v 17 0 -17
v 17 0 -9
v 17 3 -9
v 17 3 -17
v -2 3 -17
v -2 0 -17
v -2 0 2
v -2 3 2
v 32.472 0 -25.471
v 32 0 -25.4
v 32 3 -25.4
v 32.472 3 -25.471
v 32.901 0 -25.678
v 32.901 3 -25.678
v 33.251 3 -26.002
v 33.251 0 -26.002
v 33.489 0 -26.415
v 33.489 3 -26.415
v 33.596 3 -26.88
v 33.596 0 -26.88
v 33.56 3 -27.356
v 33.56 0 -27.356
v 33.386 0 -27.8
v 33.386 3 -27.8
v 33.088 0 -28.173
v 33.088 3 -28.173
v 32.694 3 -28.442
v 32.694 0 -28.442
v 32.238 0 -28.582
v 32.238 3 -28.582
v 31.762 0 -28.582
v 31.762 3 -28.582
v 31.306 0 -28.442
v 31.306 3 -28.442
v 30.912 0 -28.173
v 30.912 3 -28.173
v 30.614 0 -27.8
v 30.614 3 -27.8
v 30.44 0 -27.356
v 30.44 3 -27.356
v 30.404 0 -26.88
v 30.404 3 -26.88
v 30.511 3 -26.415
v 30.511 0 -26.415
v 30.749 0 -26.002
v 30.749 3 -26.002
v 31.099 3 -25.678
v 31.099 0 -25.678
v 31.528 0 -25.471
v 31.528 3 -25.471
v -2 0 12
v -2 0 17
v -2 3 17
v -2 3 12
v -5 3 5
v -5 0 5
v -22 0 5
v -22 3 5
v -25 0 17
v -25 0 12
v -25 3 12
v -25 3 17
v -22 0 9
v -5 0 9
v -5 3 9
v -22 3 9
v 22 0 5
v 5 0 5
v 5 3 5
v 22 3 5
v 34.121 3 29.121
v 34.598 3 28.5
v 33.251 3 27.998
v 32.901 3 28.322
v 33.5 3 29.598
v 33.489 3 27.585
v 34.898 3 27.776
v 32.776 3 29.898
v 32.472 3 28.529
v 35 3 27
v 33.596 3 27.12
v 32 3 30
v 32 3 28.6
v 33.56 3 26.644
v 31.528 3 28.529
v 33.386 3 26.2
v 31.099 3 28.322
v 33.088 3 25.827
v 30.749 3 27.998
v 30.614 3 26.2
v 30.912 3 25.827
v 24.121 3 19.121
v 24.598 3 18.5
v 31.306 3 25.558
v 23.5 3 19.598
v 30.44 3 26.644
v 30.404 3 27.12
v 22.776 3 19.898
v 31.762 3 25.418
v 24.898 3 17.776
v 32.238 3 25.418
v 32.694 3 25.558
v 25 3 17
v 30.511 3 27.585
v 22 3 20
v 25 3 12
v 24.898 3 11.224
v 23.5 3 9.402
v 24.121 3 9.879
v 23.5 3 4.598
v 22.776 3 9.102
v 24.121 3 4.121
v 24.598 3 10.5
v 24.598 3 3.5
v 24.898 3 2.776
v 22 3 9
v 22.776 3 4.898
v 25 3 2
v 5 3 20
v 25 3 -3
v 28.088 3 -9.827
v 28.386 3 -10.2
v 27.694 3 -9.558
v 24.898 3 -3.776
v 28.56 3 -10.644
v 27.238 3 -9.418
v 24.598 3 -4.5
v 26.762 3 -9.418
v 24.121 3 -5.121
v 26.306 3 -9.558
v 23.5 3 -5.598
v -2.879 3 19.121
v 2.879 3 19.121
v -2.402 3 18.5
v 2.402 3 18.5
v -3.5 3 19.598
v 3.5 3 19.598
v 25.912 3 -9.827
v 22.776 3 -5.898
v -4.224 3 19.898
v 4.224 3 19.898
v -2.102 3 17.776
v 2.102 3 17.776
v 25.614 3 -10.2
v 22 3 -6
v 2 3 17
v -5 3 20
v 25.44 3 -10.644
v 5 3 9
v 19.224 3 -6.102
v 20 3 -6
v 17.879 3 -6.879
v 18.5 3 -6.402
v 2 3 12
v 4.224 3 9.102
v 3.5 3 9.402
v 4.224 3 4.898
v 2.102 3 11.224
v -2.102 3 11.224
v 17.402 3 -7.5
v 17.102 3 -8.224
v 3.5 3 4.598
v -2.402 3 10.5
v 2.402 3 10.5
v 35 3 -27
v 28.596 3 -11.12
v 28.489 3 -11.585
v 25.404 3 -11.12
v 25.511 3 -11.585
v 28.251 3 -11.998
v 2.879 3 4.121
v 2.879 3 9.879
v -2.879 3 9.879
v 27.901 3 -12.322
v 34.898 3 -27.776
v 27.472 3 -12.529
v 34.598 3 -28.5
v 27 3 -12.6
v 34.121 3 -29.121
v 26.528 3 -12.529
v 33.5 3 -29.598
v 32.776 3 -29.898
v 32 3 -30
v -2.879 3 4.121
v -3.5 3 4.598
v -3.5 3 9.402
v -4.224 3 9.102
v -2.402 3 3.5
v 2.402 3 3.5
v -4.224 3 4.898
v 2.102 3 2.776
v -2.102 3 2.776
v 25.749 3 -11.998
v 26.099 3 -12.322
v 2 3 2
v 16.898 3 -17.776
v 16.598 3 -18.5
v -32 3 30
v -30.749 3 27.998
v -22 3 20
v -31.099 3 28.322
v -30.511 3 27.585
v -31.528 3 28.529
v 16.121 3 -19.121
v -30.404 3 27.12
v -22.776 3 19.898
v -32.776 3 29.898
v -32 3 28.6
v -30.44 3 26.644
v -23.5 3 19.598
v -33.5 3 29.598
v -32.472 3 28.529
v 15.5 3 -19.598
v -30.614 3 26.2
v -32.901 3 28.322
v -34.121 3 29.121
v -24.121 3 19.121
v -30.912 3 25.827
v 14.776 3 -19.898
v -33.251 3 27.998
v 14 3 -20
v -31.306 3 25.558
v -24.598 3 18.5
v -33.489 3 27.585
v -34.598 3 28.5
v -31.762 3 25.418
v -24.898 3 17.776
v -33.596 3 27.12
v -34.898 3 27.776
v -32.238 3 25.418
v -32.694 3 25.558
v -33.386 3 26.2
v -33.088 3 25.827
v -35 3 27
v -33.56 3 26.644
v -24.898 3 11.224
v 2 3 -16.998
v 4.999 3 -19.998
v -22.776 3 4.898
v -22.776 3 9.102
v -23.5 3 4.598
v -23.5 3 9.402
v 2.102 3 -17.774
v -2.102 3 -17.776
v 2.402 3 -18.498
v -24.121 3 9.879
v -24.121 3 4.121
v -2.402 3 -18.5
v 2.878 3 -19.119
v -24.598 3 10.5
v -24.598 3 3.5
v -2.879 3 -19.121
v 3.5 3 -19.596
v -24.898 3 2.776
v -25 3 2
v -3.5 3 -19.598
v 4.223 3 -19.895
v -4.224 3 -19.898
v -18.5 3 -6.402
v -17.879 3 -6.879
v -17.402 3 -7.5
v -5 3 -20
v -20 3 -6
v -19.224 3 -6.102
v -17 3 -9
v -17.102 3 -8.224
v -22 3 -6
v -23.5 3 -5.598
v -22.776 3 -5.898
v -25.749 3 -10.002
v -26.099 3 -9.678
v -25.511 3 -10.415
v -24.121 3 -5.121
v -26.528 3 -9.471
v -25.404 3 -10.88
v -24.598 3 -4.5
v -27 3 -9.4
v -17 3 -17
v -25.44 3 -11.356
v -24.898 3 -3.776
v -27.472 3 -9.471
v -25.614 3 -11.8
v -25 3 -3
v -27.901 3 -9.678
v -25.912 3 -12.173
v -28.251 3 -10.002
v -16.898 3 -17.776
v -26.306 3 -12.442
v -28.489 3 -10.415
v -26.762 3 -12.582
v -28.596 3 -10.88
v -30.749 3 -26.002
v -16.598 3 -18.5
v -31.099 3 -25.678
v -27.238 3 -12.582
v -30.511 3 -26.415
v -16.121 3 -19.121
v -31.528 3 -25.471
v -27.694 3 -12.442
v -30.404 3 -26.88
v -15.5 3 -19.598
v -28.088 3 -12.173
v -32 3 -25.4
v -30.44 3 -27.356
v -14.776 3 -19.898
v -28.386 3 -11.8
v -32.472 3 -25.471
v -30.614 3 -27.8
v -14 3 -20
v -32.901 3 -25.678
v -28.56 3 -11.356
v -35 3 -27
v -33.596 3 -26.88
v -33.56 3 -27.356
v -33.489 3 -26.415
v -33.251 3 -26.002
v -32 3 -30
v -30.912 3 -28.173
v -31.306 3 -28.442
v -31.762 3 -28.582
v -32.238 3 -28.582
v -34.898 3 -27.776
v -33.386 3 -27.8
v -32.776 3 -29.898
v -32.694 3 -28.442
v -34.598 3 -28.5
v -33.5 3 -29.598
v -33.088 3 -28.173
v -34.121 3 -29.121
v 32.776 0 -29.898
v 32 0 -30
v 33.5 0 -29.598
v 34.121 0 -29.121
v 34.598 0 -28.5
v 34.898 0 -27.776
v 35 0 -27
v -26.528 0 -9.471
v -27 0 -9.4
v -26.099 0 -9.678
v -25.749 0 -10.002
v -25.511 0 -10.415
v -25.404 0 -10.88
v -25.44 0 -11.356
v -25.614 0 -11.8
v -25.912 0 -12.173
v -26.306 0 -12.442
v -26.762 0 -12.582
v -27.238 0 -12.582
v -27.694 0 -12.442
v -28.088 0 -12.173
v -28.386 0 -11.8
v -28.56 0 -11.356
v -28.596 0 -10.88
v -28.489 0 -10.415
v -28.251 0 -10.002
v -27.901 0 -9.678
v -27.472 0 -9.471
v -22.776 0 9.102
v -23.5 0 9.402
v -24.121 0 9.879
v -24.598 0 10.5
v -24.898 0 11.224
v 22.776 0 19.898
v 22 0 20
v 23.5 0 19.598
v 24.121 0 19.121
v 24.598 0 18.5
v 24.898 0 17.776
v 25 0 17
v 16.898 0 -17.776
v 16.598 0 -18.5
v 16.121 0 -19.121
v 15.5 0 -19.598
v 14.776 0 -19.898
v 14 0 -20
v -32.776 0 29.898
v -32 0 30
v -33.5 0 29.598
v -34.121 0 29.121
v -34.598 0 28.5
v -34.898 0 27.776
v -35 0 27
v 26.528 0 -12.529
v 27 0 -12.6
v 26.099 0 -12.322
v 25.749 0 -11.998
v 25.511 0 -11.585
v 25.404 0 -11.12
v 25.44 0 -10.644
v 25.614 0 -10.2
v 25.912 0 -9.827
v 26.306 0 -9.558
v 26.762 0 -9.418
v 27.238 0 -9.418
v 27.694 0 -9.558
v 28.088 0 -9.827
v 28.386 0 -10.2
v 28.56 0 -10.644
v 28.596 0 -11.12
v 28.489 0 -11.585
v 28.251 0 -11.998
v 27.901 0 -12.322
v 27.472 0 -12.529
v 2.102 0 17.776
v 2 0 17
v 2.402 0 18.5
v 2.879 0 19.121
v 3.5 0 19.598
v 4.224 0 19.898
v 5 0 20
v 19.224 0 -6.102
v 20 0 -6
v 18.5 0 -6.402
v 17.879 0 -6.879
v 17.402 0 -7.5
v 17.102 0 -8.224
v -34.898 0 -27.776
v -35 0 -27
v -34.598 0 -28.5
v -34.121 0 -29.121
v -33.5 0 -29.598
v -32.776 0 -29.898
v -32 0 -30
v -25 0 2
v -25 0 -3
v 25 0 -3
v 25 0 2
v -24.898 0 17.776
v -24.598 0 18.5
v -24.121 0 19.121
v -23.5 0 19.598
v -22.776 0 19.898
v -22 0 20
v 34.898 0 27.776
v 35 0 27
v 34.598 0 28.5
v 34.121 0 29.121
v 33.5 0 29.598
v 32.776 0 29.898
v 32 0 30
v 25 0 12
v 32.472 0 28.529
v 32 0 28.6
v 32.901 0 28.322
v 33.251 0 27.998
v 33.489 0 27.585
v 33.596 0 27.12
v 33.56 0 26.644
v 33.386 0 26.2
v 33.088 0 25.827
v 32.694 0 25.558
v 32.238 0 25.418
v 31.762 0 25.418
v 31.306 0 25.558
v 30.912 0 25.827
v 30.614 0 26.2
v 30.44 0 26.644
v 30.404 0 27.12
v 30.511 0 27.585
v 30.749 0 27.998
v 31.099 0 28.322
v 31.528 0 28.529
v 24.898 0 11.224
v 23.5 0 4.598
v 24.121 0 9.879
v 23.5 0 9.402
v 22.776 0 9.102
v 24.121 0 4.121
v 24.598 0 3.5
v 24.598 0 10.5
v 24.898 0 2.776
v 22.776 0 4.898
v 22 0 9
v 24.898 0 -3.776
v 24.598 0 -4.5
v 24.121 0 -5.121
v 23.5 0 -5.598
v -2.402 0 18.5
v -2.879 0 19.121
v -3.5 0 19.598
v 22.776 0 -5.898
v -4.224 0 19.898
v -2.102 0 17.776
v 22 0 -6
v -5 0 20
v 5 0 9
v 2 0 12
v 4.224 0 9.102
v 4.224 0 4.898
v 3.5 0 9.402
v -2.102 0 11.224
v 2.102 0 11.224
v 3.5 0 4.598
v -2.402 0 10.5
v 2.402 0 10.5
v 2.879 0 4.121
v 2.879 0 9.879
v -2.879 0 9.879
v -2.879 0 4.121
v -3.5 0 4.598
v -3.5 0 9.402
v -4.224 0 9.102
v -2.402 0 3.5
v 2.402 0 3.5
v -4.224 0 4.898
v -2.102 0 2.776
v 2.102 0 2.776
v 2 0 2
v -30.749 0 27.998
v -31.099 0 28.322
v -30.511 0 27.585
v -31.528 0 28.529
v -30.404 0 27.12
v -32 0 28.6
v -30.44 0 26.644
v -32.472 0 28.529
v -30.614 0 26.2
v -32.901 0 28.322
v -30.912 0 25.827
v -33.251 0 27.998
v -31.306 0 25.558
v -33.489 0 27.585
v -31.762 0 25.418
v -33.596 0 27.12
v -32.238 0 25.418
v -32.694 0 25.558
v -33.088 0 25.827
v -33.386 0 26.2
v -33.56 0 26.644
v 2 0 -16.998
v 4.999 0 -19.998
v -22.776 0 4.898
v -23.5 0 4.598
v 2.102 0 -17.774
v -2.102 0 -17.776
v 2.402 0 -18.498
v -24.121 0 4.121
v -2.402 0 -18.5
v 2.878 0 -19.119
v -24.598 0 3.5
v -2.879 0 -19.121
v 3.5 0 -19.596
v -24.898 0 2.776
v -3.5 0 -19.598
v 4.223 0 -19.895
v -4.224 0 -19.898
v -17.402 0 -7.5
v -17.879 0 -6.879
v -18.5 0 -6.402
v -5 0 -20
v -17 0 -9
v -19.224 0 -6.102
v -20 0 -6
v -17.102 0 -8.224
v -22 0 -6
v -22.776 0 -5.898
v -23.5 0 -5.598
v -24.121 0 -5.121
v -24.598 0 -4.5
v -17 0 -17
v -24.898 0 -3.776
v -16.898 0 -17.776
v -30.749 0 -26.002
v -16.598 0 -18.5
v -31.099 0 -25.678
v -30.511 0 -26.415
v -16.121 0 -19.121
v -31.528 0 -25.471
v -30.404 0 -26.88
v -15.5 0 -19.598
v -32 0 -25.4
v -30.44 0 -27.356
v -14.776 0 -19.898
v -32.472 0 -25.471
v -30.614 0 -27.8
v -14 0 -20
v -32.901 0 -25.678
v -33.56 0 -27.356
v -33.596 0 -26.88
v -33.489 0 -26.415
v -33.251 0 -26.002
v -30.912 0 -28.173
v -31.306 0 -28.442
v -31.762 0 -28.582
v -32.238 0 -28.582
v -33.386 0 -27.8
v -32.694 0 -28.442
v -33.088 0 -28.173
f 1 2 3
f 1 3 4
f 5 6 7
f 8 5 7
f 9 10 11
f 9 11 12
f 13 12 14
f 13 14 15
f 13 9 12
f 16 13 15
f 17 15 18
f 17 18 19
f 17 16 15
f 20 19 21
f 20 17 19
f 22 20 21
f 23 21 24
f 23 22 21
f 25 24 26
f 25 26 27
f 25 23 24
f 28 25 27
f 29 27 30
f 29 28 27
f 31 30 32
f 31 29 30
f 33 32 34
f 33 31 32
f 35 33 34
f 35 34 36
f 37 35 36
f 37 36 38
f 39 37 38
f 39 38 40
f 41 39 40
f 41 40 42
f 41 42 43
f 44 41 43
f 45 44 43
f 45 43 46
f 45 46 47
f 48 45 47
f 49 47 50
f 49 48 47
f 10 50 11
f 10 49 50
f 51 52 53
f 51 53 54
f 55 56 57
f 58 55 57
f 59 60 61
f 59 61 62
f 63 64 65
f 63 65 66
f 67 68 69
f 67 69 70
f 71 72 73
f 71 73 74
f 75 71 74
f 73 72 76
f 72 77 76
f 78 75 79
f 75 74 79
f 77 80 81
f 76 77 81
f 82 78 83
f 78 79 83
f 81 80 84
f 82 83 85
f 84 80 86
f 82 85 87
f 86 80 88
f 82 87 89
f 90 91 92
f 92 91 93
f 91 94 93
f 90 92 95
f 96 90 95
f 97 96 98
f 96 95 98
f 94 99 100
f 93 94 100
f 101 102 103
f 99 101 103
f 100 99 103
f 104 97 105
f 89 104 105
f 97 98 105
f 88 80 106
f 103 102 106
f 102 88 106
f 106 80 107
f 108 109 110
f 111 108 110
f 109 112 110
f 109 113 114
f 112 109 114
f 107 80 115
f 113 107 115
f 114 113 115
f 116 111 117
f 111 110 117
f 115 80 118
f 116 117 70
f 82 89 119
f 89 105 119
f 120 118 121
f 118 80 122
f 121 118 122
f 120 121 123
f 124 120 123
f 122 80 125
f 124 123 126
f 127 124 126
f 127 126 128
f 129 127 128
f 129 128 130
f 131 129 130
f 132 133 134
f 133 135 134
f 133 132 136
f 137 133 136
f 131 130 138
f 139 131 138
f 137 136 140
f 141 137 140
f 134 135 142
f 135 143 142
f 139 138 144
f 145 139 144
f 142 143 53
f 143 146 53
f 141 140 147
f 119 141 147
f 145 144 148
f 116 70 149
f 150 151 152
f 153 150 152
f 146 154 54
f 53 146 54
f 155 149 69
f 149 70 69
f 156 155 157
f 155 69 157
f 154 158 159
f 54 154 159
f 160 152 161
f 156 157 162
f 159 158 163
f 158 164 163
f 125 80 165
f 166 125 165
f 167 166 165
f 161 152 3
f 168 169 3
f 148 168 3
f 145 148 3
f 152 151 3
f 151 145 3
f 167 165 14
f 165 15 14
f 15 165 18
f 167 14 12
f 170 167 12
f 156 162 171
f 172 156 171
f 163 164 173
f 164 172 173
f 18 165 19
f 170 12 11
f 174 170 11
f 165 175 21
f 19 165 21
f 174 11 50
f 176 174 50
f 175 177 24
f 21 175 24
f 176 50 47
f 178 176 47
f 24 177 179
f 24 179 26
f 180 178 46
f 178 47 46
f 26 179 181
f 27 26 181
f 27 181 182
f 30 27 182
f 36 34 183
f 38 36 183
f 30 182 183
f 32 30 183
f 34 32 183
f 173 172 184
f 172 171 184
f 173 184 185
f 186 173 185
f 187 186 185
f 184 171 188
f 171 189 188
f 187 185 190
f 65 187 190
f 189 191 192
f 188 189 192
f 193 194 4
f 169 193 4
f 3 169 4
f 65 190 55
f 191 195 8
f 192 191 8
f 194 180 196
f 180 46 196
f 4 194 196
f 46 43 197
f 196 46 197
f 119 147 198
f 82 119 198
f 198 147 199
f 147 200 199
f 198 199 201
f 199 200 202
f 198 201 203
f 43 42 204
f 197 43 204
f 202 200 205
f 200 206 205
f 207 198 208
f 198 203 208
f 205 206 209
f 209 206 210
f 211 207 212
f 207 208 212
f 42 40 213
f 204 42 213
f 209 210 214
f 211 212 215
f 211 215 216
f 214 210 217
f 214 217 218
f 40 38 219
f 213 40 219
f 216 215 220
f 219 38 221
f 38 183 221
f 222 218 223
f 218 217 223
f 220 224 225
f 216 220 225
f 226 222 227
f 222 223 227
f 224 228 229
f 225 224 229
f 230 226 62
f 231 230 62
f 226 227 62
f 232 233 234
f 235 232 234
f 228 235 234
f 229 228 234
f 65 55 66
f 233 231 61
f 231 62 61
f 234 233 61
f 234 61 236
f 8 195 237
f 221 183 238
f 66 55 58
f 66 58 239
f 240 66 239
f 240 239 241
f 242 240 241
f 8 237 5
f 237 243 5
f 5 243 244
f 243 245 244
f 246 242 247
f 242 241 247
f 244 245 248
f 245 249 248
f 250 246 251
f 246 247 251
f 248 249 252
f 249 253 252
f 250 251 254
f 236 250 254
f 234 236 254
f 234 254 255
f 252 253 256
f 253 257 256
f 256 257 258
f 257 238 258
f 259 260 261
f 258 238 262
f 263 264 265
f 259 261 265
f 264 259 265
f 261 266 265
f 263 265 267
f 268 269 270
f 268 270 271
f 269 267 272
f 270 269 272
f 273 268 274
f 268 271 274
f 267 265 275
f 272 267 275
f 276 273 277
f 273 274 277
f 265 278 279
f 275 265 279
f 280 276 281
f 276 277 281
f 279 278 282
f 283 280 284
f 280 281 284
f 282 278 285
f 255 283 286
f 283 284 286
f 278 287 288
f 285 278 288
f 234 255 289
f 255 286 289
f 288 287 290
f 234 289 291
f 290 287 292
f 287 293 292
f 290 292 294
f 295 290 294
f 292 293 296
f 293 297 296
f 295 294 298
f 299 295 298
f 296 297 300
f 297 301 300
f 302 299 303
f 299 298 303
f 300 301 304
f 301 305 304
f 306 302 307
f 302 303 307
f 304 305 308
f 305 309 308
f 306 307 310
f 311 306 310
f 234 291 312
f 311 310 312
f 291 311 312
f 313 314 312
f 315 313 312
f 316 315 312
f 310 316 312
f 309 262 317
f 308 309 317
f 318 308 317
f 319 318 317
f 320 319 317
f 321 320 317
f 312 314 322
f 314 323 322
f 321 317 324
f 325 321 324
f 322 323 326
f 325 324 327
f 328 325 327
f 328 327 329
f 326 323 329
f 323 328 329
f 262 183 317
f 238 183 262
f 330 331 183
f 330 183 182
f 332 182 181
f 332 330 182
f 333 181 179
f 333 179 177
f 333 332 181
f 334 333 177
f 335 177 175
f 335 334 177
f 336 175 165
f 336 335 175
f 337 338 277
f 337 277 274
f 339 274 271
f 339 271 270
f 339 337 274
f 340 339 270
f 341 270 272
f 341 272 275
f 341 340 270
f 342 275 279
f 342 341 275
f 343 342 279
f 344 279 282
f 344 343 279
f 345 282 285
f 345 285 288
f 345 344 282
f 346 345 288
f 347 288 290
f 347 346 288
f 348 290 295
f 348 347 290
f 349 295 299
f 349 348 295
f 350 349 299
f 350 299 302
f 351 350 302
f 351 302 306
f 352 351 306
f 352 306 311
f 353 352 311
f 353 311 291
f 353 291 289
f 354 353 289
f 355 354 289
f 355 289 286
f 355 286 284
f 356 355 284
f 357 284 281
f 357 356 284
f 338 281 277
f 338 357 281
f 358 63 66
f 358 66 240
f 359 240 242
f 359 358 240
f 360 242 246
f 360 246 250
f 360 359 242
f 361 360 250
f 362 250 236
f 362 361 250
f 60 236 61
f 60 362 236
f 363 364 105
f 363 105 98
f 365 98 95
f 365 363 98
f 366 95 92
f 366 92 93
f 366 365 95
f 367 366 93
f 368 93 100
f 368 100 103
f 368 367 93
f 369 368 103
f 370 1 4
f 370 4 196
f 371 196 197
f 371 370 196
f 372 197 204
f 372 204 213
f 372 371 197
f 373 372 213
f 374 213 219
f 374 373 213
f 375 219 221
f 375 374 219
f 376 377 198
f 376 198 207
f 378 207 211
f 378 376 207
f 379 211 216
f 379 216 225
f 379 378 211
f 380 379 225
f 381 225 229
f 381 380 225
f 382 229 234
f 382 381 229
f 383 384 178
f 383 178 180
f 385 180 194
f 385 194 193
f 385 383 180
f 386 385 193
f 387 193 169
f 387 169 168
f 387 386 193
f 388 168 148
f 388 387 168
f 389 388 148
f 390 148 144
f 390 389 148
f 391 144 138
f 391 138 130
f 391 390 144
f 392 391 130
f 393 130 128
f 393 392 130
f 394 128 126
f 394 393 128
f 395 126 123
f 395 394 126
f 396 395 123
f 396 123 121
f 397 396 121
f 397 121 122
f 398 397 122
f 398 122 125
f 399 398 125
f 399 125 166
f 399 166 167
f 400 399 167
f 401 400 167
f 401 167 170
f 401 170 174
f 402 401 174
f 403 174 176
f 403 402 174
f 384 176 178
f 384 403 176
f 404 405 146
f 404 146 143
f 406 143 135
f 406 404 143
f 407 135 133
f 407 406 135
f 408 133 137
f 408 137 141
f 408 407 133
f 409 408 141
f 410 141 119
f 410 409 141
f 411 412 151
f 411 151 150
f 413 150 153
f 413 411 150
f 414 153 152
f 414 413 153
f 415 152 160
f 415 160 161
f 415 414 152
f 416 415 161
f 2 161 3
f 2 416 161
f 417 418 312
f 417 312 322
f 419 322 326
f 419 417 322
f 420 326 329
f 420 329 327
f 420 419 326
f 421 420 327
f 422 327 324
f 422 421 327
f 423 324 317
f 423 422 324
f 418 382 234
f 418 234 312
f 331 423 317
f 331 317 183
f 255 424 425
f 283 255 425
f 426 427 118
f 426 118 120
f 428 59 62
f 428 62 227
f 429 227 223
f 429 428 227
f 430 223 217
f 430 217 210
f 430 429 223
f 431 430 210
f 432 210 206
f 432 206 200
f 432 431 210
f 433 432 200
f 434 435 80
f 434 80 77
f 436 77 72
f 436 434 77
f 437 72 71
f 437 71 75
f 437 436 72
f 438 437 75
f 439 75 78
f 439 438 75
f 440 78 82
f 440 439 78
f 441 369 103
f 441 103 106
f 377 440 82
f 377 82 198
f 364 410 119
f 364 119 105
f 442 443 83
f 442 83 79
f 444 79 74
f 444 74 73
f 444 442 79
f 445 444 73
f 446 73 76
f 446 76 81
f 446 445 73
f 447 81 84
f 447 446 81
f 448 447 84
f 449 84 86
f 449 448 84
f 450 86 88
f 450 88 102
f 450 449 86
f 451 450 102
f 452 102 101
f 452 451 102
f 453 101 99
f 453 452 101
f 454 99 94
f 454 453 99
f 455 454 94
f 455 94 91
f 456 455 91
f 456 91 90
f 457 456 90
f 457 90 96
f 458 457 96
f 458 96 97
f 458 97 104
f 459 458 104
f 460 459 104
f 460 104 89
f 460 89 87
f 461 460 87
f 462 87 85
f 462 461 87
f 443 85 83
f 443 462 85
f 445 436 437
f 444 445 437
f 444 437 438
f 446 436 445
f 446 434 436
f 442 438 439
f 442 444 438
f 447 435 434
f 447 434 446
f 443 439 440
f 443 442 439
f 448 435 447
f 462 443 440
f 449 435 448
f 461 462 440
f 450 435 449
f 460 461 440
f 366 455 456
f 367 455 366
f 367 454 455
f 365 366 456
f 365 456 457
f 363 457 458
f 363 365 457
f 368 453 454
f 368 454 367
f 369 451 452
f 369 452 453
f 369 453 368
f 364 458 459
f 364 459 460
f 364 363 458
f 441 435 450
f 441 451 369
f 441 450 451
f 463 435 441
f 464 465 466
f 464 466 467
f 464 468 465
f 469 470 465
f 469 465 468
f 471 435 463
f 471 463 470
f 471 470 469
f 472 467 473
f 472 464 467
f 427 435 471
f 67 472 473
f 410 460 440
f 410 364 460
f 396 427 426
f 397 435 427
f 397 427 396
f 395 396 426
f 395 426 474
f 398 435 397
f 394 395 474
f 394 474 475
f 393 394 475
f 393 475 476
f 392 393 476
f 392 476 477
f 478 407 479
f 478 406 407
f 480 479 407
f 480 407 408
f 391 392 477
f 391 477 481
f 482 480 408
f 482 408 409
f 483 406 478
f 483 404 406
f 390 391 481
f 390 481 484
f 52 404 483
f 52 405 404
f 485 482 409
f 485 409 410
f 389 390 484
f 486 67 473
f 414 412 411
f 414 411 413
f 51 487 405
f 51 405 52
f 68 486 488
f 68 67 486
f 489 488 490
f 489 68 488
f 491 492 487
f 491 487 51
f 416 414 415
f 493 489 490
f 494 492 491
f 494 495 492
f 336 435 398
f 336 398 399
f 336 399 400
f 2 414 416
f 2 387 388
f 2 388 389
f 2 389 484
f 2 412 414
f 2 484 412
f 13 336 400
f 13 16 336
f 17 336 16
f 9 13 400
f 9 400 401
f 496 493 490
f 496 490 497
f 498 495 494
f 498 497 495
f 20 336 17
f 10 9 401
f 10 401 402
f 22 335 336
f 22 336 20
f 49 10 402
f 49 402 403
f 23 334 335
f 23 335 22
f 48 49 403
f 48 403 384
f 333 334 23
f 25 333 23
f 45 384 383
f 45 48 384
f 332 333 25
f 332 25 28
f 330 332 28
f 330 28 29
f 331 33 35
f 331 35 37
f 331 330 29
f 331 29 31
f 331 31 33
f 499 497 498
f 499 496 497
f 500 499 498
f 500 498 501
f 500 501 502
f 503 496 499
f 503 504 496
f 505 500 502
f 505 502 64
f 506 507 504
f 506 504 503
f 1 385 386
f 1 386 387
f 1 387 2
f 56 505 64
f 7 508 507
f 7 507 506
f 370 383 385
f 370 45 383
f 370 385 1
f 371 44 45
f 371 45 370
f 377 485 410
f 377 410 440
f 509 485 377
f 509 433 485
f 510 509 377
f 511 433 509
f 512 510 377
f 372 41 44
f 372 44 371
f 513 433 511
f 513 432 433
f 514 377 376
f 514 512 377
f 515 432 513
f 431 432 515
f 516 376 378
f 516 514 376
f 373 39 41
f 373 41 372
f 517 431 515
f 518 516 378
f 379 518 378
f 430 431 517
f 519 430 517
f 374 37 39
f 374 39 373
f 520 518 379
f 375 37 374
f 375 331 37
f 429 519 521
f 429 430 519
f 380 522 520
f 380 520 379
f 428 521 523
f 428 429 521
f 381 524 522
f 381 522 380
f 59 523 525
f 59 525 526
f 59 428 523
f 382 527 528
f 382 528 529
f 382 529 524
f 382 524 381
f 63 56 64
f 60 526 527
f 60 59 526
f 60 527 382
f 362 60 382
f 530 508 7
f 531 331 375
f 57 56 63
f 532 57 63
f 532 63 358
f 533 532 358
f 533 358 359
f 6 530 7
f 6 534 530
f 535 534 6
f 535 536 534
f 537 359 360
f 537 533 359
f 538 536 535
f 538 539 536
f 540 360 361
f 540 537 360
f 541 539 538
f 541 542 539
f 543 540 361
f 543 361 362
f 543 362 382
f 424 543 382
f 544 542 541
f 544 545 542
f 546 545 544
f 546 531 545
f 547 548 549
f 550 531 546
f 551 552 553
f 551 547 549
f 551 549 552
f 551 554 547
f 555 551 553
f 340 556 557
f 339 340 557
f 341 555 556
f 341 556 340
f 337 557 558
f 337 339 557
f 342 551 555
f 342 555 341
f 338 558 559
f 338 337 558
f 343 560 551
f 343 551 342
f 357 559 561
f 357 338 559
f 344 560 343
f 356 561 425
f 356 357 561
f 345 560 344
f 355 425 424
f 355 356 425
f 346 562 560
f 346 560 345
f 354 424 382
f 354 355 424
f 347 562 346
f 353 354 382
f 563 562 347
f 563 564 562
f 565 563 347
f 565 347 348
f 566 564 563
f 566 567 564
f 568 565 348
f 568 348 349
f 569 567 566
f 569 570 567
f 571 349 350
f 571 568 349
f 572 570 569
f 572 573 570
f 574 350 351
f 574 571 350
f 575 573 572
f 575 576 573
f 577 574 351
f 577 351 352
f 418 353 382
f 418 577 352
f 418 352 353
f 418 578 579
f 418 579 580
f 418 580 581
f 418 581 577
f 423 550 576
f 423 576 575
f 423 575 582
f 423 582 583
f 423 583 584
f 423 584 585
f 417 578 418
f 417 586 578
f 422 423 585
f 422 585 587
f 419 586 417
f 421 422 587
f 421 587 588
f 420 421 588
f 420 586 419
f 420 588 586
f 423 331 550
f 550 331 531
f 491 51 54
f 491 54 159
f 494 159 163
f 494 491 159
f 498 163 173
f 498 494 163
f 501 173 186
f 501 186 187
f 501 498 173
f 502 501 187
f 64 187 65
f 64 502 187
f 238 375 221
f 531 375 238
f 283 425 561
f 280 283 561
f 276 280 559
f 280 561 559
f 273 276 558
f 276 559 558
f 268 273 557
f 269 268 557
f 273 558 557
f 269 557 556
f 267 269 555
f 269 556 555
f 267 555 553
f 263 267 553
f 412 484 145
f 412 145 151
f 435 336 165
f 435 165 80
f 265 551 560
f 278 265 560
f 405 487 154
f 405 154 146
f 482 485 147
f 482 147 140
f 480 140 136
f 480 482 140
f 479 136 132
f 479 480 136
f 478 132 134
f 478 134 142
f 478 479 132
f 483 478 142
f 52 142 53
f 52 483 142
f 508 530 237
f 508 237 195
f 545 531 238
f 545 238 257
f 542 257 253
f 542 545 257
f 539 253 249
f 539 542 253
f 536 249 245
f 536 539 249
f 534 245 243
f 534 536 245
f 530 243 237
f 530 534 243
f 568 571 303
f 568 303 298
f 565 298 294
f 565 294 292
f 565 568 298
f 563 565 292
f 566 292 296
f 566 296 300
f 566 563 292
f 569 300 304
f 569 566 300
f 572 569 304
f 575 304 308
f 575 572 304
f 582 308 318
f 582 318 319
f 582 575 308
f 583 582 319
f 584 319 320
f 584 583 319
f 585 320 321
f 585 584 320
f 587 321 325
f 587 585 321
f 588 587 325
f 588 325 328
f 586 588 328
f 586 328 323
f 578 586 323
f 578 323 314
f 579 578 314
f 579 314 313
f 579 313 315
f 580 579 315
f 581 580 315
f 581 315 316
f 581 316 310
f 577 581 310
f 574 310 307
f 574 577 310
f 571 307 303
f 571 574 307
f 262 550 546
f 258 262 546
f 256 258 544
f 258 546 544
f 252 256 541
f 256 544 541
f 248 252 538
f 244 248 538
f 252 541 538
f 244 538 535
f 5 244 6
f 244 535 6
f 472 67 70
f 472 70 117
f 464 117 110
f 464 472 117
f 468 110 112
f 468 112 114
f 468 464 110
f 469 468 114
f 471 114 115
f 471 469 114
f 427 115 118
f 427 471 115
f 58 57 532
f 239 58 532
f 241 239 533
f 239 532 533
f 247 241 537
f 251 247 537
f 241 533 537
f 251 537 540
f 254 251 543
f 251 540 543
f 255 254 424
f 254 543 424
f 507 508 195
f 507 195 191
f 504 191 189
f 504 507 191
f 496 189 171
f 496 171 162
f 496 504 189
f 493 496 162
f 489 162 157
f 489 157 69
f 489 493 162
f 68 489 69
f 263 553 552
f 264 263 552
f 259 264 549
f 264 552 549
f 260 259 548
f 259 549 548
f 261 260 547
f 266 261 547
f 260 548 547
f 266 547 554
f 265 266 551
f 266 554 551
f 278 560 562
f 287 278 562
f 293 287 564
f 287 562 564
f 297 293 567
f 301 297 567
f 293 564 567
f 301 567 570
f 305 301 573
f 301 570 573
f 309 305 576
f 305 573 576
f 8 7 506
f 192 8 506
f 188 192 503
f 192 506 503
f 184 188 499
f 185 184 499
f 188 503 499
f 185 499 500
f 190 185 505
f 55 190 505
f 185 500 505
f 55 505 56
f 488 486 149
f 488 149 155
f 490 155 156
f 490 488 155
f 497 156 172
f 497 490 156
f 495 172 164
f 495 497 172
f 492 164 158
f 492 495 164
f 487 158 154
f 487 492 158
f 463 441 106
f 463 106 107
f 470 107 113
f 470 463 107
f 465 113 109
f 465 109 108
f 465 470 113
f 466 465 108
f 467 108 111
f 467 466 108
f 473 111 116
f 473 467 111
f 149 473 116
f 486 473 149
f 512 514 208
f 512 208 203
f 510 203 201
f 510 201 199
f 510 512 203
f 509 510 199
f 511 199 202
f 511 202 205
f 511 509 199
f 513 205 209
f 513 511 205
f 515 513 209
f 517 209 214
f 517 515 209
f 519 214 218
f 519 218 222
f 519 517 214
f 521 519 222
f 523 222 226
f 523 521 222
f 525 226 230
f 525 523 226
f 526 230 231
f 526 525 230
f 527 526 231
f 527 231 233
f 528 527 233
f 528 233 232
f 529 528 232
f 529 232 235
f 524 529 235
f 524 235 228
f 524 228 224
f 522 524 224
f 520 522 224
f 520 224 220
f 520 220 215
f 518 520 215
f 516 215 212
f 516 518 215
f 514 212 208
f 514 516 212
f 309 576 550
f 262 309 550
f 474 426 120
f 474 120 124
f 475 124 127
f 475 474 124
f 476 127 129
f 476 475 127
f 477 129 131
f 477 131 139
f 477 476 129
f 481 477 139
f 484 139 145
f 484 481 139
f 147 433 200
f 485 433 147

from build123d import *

# Parameters (mm, degrees)
SKETCH_1_R          = 1.6
EXTRUDE_1_DEPTH     = 3
CUT_EXTRUDE_START   = -3
SKETCH_2_R          = 1.6
CUT_EXTRUDE_1_DEPTH = 3
CUT_EXTRUDE_2_DEPTH = 3


with BuildPart() as part:
    # 草图1 → 凸台-拉伸1 (new body)
    with BuildSketch(Plane(origin=(0, 0, 0), x_dir=(1, 0, 0), z_dir=(0, 1, 0))):
        with BuildLine():
            Line((-32, 30), (32, 30))
            ThreePointArc((32, 30), (34.121320344, 29.121320344), (35, 27))
            Line((35, 27), (35, -27))
            ThreePointArc((35, -27), (34.121320344, -29.121320344), (32, -30))
            Line((32, -30), (-32, -30))
            ThreePointArc((-32, -30), (-34.121320344, -29.121320344), (-35, -27))
            Line((-35, -27), (-35, 27))
            ThreePointArc((-35, 27), (-34.121320344, 29.121320344), (-32, 30))
        make_face()
        with Locations(Location((-32, 27, 0), (0, 0, 270))):
            Circle(SKETCH_1_R, mode=Mode.SUBTRACT)
        with Locations(Location((32, 27, 0), (0, 0, 270))):
            Circle(SKETCH_1_R, mode=Mode.SUBTRACT)
        with Locations(Location((-32, -27, 0), (0, 0, 270))):
            Circle(SKETCH_1_R, mode=Mode.SUBTRACT)
        with Locations(Location((32, -27, 0), (0, 0, 270))):
            Circle(SKETCH_1_R, mode=Mode.SUBTRACT)
    extrude(amount=EXTRUDE_1_DEPTH)

    # 草图2 → 切除-拉伸1 (cut)
    with BuildSketch(Plane(origin=(0, 3, 0), x_dir=(1, 0, 0), z_dir=(0, 1, 0)).offset(CUT_EXTRUDE_START)):
        with Locations(Location((-27, 11, 0), (0, 0, 270))):
            Circle(SKETCH_2_R)
        with Locations(Location((27, 11, 0), (0, 0, 90))):
            Circle(SKETCH_2_R)
        with Locations(Location((-32, 27, 0), (0, 0, 270))):
            Circle(SKETCH_2_R)
    extrude(amount=CUT_EXTRUDE_1_DEPTH, mode=Mode.SUBTRACT)

    # 草图3 → 切除-拉伸2 (cut)
    with BuildSketch(Plane.XZ):
        with BuildLine():
            Line((-22, 20), (-5, 20))
            ThreePointArc((-5, 20), (-2.878679656, 19.121320344), (-2, 17))
            Line((-2, 17), (-2, 12))
            ThreePointArc((-2, 12), (-2.878679656, 9.878679656), (-5, 9))
            Line((-5, 9), (-22, 9))
            ThreePointArc((-22, 9), (-24.121320344, 9.878679656), (-25, 12))
            Line((-25, 12), (-25, 17))
            ThreePointArc((-25, 17), (-24.121320344, 19.121320344), (-22, 20))
        make_face()
        with BuildLine():
            Line((-22, -6), (-20, -6))
            ThreePointArc((-20, -6), (-17.878679656, -6.878679656), (-17, -9))
            Line((-17, -9), (-17, -17))
            ThreePointArc((-17, -17), (-16.121320344, -19.121320344), (-14, -20))
            Line((-14, -20), (-5, -20))
            ThreePointArc((-5, -20), (-2.878679656, -19.121320344), (-2, -17))
            Line((-2, -17), (-2, 2))
            ThreePointArc((-2, 2), (-2.878679656, 4.121320344), (-5, 5))
            Line((-5, 5), (-22, 5))
            ThreePointArc((-22, 5), (-24.121320344, 4.121320344), (-25, 2))
            Line((-25, 2), (-25, -3))
            ThreePointArc((-25, -3), (-24.121320344, -5.121320344), (-22, -6))
        make_face()
        with BuildLine():
            Line((25, 17), (25, 12))
            ThreePointArc((25, 12), (24.121320344, 9.878679656), (22, 9))
            Line((22, 9), (5, 9))
            ThreePointArc((5, 9), (2.878679656, 9.878679656), (2, 12))
            Line((2, 12), (2, 17))
            ThreePointArc((2, 17), (2.878679656, 19.121320344), (5, 20))
            Line((5, 20), (22, 20))
            ThreePointArc((22, 20), (24.121320344, 19.121320344), (25, 17))
        make_face()
        with BuildLine():
            Line((17, -9), (17, -17))
            ThreePointArc((17, -17), (16.121320344, -19.121320344), (14, -20))
            Line((14, -20), (4.999263136, -19.997789228))
            ThreePointArc((4.999263136, -19.997789228), (2.878419152, -19.118849125), (2, -16.997789318))
            Line((2, -16.997789318), (2, 2))
            ThreePointArc((2, 2), (2.878679656, 4.121320344), (5, 5))
            Line((5, 5), (22, 5))
            ThreePointArc((22, 5), (24.121320344, 4.121320344), (25, 2))
            Line((25, 2), (25, -3))
            ThreePointArc((25, -3), (24.121320344, -5.121320344), (22, -6))
            Line((22, -6), (20, -6))
            ThreePointArc((20, -6), (17.878679656, -6.878679656), (17, -9))
        make_face()
    extrude(amount=-CUT_EXTRUDE_2_DEPTH, mode=Mode.SUBTRACT)


solid = part.part
